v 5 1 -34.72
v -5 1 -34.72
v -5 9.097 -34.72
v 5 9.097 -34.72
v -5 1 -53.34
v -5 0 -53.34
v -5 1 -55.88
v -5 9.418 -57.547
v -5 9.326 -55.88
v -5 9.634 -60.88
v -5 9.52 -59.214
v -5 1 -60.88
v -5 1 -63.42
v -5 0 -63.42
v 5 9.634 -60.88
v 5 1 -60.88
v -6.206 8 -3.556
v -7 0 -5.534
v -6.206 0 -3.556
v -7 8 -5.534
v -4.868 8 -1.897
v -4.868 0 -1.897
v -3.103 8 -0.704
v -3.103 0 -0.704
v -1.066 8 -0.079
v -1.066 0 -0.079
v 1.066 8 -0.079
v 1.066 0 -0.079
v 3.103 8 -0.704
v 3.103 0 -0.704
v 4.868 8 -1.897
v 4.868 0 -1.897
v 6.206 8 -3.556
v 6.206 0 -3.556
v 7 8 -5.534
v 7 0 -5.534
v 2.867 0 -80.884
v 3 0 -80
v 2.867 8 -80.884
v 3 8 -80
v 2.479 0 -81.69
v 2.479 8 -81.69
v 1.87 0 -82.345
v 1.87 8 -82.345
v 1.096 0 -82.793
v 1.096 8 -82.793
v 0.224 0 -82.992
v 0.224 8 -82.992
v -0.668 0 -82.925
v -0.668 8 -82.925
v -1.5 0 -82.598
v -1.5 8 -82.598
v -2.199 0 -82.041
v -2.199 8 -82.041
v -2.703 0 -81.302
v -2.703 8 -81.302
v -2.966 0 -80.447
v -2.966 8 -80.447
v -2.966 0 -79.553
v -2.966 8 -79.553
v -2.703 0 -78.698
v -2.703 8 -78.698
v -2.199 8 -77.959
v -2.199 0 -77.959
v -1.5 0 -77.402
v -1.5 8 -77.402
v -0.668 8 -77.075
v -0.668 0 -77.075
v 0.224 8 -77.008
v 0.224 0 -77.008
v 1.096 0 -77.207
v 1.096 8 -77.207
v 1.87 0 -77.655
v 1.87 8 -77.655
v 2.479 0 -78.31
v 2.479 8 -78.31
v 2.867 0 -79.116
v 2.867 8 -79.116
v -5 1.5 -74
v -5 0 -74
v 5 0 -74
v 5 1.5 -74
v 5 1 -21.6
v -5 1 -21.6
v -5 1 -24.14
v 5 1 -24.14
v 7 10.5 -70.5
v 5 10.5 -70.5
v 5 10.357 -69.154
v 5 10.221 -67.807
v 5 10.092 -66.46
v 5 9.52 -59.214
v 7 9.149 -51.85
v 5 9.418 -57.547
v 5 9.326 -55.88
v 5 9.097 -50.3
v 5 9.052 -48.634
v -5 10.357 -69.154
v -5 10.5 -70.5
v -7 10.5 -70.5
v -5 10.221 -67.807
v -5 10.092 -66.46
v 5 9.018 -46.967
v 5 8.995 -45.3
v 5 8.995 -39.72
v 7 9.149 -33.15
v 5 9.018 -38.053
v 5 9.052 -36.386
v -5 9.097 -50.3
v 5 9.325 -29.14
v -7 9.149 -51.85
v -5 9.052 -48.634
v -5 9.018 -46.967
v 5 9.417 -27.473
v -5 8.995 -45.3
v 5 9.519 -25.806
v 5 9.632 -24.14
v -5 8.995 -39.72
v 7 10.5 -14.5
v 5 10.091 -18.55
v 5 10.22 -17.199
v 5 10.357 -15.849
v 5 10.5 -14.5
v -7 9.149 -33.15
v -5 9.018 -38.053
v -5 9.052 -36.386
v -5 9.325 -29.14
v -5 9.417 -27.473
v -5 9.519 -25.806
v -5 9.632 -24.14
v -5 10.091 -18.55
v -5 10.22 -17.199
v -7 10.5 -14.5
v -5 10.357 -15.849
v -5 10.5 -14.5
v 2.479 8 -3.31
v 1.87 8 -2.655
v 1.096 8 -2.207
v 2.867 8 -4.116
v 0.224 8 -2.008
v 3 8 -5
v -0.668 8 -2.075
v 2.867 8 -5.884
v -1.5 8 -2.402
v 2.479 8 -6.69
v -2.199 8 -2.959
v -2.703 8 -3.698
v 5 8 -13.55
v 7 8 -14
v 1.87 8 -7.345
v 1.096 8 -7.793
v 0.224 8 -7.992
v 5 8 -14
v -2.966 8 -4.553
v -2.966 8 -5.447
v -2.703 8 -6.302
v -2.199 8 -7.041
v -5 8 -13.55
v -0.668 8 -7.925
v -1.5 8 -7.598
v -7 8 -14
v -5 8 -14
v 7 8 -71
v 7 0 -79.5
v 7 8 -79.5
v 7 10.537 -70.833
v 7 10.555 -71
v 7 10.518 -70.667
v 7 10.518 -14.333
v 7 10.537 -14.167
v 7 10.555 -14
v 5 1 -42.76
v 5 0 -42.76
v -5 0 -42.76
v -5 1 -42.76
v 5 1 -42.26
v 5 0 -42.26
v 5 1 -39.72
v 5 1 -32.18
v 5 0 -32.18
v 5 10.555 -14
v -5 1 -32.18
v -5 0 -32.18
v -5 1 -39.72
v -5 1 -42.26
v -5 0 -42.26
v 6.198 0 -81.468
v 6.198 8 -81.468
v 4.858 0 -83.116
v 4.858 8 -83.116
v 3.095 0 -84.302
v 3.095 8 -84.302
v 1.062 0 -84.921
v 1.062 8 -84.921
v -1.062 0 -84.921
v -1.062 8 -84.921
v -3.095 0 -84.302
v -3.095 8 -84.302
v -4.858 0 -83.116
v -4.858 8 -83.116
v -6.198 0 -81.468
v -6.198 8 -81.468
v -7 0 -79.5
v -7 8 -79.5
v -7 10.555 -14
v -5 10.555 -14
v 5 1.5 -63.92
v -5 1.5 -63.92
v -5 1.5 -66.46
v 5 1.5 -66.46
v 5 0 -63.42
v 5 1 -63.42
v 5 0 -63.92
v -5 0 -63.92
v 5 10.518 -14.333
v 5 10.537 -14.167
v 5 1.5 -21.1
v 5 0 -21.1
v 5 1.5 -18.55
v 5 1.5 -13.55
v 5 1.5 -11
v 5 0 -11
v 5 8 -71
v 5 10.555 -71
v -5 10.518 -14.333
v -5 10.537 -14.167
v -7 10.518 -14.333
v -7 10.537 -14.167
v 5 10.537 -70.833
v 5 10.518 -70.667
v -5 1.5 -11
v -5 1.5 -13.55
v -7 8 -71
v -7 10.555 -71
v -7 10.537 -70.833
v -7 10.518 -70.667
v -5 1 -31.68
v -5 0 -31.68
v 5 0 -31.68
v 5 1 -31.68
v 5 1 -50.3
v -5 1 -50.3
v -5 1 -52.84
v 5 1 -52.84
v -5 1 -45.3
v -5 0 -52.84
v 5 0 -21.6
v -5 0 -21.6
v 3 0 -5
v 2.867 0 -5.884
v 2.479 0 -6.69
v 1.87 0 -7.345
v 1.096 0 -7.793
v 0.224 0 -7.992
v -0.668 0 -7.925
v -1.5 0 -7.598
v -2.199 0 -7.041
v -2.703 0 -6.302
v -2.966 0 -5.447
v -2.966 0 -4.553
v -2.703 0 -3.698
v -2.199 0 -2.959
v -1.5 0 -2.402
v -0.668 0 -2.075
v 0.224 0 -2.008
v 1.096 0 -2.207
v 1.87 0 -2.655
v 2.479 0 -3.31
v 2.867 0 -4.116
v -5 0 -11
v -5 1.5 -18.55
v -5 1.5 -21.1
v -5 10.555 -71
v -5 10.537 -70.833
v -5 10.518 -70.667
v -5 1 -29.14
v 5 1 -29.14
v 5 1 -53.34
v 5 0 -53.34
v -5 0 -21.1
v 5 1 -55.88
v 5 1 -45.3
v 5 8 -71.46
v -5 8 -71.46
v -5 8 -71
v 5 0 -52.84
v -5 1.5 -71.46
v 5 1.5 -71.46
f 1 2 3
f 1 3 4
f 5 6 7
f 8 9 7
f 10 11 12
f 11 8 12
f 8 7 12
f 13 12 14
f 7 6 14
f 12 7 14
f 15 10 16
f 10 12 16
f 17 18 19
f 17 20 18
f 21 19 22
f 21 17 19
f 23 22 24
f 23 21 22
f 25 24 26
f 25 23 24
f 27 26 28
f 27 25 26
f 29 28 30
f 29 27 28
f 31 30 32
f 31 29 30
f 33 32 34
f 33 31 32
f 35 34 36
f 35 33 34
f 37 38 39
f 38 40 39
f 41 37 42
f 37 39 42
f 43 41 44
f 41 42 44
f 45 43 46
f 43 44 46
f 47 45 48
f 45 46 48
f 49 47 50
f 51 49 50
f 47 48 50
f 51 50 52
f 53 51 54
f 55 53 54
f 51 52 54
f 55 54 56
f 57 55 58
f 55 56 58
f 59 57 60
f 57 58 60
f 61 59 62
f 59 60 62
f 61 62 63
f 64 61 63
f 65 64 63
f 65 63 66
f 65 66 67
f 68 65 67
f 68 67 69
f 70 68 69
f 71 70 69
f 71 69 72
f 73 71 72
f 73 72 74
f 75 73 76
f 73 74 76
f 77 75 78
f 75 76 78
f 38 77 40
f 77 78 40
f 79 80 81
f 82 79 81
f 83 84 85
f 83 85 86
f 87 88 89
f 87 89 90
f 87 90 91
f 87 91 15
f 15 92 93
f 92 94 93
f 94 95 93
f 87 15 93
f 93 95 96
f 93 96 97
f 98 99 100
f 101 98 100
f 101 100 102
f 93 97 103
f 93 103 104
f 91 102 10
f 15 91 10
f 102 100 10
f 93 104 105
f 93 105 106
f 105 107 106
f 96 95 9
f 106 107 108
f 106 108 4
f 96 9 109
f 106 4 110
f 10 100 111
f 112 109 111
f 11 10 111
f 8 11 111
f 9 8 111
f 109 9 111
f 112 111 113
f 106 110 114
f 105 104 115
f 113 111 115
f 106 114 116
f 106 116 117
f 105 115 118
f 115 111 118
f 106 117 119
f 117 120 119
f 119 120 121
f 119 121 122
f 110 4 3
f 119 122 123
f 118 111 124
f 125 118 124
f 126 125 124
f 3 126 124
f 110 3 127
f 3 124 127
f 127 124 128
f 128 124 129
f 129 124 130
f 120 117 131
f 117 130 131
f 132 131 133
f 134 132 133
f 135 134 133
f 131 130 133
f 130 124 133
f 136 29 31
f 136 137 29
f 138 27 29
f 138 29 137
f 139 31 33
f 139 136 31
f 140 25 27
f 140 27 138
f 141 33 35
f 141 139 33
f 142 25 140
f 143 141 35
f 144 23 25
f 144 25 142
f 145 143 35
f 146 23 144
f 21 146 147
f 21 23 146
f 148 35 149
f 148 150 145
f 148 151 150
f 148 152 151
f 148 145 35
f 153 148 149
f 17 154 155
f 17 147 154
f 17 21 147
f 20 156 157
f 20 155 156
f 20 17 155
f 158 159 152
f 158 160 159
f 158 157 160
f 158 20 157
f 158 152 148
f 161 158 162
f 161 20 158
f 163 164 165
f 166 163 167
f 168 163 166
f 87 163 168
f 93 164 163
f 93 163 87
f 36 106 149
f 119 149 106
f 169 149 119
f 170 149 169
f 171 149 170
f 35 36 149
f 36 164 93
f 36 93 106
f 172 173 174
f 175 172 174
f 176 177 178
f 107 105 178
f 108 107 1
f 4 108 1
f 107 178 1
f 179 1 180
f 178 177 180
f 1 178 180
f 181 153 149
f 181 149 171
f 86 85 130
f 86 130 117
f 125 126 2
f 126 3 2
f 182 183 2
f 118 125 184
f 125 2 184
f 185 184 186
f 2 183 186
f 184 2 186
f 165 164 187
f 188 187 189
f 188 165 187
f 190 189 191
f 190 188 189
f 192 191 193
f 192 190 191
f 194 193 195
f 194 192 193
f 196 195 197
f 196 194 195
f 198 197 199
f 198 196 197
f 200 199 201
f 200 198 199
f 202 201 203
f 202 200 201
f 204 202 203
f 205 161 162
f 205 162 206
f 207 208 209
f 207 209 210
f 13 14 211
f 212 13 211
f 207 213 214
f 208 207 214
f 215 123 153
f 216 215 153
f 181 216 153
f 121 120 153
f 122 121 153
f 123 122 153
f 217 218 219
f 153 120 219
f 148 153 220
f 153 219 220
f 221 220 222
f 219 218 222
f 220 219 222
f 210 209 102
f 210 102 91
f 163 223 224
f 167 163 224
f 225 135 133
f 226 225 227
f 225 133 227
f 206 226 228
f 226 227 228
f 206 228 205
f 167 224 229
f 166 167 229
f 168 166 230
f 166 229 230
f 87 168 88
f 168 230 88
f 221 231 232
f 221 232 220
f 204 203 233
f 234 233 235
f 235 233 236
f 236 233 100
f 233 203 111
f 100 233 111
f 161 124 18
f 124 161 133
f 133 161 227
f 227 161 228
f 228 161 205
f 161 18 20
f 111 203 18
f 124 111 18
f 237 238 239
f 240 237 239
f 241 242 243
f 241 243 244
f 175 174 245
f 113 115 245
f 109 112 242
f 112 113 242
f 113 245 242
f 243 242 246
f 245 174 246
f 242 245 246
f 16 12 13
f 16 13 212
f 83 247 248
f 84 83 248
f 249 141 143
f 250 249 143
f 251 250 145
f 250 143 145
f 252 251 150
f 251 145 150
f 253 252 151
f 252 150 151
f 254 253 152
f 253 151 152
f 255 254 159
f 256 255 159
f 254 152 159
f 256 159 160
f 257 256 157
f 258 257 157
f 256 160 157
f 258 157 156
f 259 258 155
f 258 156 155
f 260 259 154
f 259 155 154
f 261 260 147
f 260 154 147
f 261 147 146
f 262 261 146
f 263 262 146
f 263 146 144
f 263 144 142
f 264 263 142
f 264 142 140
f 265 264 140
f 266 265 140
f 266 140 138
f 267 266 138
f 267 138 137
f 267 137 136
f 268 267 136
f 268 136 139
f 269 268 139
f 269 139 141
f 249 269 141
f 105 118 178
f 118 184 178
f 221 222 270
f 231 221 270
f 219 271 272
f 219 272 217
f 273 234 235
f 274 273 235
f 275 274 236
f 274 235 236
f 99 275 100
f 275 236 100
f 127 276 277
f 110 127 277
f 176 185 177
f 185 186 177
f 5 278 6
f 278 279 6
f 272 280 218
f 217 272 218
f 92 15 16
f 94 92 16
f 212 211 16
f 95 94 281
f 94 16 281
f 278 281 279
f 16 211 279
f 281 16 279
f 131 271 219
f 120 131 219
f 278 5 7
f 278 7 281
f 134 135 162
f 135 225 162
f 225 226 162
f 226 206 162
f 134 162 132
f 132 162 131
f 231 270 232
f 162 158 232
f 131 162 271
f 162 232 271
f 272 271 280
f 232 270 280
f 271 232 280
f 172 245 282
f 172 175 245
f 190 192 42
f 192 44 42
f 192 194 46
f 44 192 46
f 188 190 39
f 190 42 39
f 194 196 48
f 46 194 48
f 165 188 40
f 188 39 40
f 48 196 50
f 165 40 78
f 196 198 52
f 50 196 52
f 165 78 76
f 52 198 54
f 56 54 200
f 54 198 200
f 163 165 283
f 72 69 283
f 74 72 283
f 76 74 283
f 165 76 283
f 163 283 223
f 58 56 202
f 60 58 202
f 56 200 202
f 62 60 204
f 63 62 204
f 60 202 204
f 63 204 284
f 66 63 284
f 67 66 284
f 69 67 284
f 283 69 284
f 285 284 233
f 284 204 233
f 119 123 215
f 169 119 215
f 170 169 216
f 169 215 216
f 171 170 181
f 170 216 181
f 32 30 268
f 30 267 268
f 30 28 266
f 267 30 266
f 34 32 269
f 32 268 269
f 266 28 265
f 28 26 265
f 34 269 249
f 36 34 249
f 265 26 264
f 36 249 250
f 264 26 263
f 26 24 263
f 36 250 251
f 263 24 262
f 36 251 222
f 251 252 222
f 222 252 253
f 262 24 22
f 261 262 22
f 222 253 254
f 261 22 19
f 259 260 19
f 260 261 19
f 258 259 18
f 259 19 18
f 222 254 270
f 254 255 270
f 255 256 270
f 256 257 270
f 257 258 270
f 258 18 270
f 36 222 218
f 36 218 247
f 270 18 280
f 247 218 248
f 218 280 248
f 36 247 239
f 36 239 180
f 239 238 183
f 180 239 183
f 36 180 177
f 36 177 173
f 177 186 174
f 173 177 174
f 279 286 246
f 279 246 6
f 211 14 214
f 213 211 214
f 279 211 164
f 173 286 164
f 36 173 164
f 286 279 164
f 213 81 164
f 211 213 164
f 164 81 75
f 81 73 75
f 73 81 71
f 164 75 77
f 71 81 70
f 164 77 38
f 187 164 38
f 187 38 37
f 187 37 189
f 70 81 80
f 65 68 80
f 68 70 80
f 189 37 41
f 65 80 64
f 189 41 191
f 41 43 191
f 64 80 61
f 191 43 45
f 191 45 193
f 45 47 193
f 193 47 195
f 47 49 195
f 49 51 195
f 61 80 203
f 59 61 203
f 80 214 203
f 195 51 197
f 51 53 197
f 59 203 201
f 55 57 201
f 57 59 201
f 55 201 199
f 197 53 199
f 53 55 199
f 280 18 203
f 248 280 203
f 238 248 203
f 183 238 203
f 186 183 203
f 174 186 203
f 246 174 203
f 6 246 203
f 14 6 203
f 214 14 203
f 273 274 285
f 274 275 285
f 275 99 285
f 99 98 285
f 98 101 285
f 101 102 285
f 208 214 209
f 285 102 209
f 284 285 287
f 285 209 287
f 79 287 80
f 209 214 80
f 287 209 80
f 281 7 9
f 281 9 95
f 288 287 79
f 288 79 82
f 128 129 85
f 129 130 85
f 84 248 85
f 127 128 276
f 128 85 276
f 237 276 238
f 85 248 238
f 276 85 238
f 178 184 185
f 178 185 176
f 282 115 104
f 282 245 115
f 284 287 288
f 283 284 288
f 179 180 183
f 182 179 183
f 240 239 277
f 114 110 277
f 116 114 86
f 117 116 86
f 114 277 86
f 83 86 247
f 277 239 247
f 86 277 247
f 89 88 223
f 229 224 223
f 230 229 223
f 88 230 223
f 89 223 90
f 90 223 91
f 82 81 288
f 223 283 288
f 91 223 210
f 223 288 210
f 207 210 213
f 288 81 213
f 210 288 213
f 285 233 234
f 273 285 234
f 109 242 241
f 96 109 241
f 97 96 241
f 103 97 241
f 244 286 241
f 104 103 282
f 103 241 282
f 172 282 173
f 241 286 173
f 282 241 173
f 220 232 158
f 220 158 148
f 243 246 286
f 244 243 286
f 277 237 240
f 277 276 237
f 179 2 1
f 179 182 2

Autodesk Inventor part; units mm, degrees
ref_plane "YZ Plane" through (0, 0, 0) normal (1, 0, 0) x (0, 1, 0)
ref_plane "XY Plane" through (0, 0, 0) normal (0, 0, 1) x (1, 0, 0)
sketch "Sketch1" plane through (0, 0, 0) normal (1, 0, 0) x (0, 1, 0)
  line L0 (0, 0) -> (0, -85)
  line L1 (0, -85) -> (8, -85)
  line L2 (0, 0) -> (8, 0)
  line L3 (8, 0) -> (8, -14)
  line L4 (8, -85) -> (8, -71)
  line L5 (8, -14) -> (9, -14)
  line L6 (8, -71) -> (9, -71)
  arc A0 (10.5, -14.5) -> (10.5, -70.5) centre (267.5593, -42.5) ccw
  line L7 (8, -71) -> (10.555, -71)
  line L8 (8, -14) -> (10.555, -14)
  arc A1 (10.555, -14) -> (10.555, -71) centre (267.5473, -42.5) ccw
extrude "Extrusion1" add sketch "Sketch1" along normal mid plane 14
sketch "Sketch2" plane through (-7, 8, 0) normal (0, 1, 0) x (1, 0, 0)
  line L0 (0, 85) -> (0, 0) projected
  line L1 (0, 14.0338) -> (0, 5.5338)
  line L2 (14, 0) -> (14, 85) projected
  line L3 (14, 14.0338) -> (14, 5.5338)
  arc A0 (0, 5.5338) -> (14, 5.5338) centre (7, 7.1942) ccw
  line L4 (0, 5.5338) -> (0, 0)
  line L5 (0, 0) -> (14, 0) projected
  line L6 (14, 0) -> (14, 5.5338)
  point P0 (7, 0)
  dimension "d13" = 8.5
extrude "Extrusion2" cut sketch "Sketch2" against normal blind 14
sketch "Sketch3" plane through (-7, 8, -71) normal (0, 1, 0) x (1, 0, 0)
  line L0 (0, 0) -> (14, 0) projected
  line L1 (0, 0) -> (0, 14) projected
  arc A0 (14, 8.5) -> (0, 8.5) centre (7, 6.7955) ccw
  line L2 (0, 8.5) -> (0, 14)
  line L3 (0, 14) -> (14, 14) projected
  line L4 (14, 14) -> (14, 8.5)
  line L5 (14, -65.4662) -> (14, 14) projected
  line L6 (0, 14) -> (0, 8.5)
  line L7 (14, 8.5) -> (14, 14)
  line L8 (14, 14) -> (0, 14)
  line L9 (0, 8.5) -> (0, 14)
  line L10 (0, 14) -> (14, 14) projected
  line L11 (14, 14) -> (14, 8.5)
  line L12 (14, 14) -> (14, 0) projected
  arc A1 (14, 8.5) -> (0, 8.5) centre (7, 6.7955) ccw
  point P0 (7, -71)
extrude "Extrusion3" cut sketch "Sketch3" against normal blind 14 contours L1 L3 A0 | A0 L3 L4
sketch "Sketch4" plane through (-7, 8, -71) normal (0, 1, 0) x (1, 0, 0)
  arc A0 (14, 8.5) -> (0, 8.5) centre (7, 6.7955) ccw projected
  line L0 (7, 0.0396) -> (7, 3.0396)
  circle A1 centre (7, 9) radius 3
  point P0 (7, -71)
extrude "Extrusion4" cut sketch "Sketch4" against normal blind 14
sketch "Sketch5" plane through (-7, 8, -14) normal (0, 1, 0) x (1, 0, 0)
  circle A0 centre (7, -9) radius 3
  point P0 (7, -14)
extrude "Extrusion5" cut sketch "Sketch5" against normal blind 14
sketch "Sketch6" plane through (0, 0, -7.1942) normal (0, -1, 0) x (1, 0, 0)
  point P0 (0, 7.1942)
sketch "Sketch7" plane through (0, 0, -7.1942) normal (0, -1, 0) x (1, 0, 0)
  circle A0 centre (0, 2.1942) radius 3 projected
  line L0 (0, -0.8058) -> (0, -3.8058)
  circle A1 centre (0, -72.8058) radius 3 projected
  line L1 (0, -69.8058) -> (0, -66.8058)
  line L2 (0, -66.8058) -> (-5, -66.8058)
  line L3 (-5, -66.8058) -> (5, -66.8058)
  line L4 (-5, -66.8058) -> (5, -66.8058)
  line L5 (5, -66.8058) -> (5, -56.7258)
  line L6 (5, -56.7258) -> (-5, -56.7258)
  line L7 (-5, -56.7258) -> (-5, -66.8058)
  line L8 (0, -56.7258) -> (0, -56.2258)
  line L9 (-5, -56.2258) -> (5, -56.2258)
  line L10 (5, -56.2258) -> (5, -46.1458)
  line L11 (5, -46.1458) -> (-5, -46.1458)
  line L12 (-5, -46.1458) -> (-5, -56.2258)
  line L13 (0, -46.1458) -> (0, -45.6458)
  line L14 (-5, -45.6458) -> (5, -45.6458)
  line L15 (5, -45.6458) -> (5, -35.5658)
  line L16 (5, -35.5658) -> (-5, -35.5658)
  line L17 (-5, -35.5658) -> (-5, -45.6458)
  line L18 (0, -35.5658) -> (0, -35.0658)
  line L19 (-5, -35.0658) -> (5, -35.0658)
  line L20 (5, -35.0658) -> (5, -24.9858)
  line L21 (5, -24.9858) -> (-5, -24.9858)
  line L22 (-5, -24.9858) -> (-5, -35.0658)
  line L23 (0, -24.9858) -> (0, -24.4858)
  line L24 (-5, -24.4858) -> (5, -24.4858)
  line L25 (5, -24.4858) -> (5, -14.4058)
  line L26 (5, -14.4058) -> (-5, -14.4058)
  line L27 (-5, -14.4058) -> (-5, -24.4858)
  line L28 (0, -14.4058) -> (0, -13.9058)
  line L29 (-5, -13.9058) -> (5, -13.9058)
  line L30 (5, -13.9058) -> (5, -3.8058)
  line L31 (5, -3.8058) -> (-5, -3.8058)
  line L32 (-5, -3.8058) -> (-5, -13.9058)
  point P0 (0, 7.1942)
extrude "Extrusion6" cut sketch "Sketch7" against normal blind 1.5 contours L6 L5 L3 L2 L7 | L31 L30 L29 L32
sketch "Sketch8" plane through (0, 0, -7.1942) normal (0, -1, 0) x (1, 0, 0)
  line L0 (-5, -56.7258) -> (5, -56.7258) projected
  line L1 (0, -56.7258) -> (0, -56.2258)
  line L2 (-5, -56.2258) -> (5, -56.2258)
  line L3 (5, -56.2258) -> (5, -46.1458)
  line L4 (5, -46.1458) -> (-5, -46.1458)
  line L5 (-5, -46.1458) -> (-5, -56.2258)
  line L6 (0, -46.1458) -> (0, -45.6458)
  line L7 (-5, -45.6458) -> (5, -45.6458)
  line L8 (5, -45.6458) -> (5, -35.5658)
  line L9 (5, -35.5658) -> (-5, -35.5658)
  line L10 (-5, -35.5658) -> (-5, -45.6458)
  line L11 (0, -35.5658) -> (0, -35.0658)
  line L12 (-5, -35.0658) -> (5, -35.0658)
  line L13 (5, -35.0658) -> (5, -24.9858)
  line L14 (5, -24.9858) -> (-5, -24.9858)
  line L15 (-5, -24.9858) -> (-5, -35.0658)
  line L16 (0, -24.9858) -> (0, -24.4858)
  line L17 (-5, -24.4858) -> (5, -24.4858)
  line L18 (5, -24.4858) -> (5, -14.4058)
  line L19 (5, -14.4058) -> (-5, -14.4058)
  line L20 (-5, -14.4058) -> (-5, -24.4858)
  point P0 (0, 7.1942)
  dimension "d75" = 0.5
  dimension "d76" = 10.08
  dimension "d77" = 0.5
  dimension "d78" = 10.08
  dimension "d79" = 0.5
  dimension "d80" = 10.08
  dimension "d81" = 0.5
  dimension "d82" = 10.08
extrude "Extrusion7" cut sketch "Sketch8" against normal blind 1
sketch "Sketch9" plane through (0, 1.5, -7.1942) normal (0, -1, 0) x (1, 0, 0)
  line L0 (-5, -66.8058) -> (-5, -56.7258) projected
  line L1 (5, -56.7258) -> (5, -66.8058) projected
  line L2 (-5, -59.2658) -> (5, -59.2658)
  line L3 (-5, -64.2658) -> (5, -64.2658)
  line L4 (-5, -64.2658) -> (-5, -59.2658)
  line L5 (5, -64.2658) -> (5, -59.2658)
  line L6 (5, -64.2658) -> (5, -59.2658)
  point P0 (0, 7.1942)
extrude "Extrusion8" cut sketch "Sketch9" against normal blind 20
sketch "Sketch10" plane through (0, 1, -7.1942) normal (0, -1, 0) x (1, 0, 0)
  line L0 (-5, -56.2258) -> (-5, -46.1458) projected
  line L1 (5, -46.1458) -> (5, -56.2258) projected
  line L2 (-5, -53.6858) -> (5, -53.6858)
  line L3 (-5, -48.6858) -> (5, -48.6858)
  line L4 (5, -48.6858) -> (5, -53.6858)
  line L5 (-5, -48.6858) -> (-5, -53.6858)
  point P0 (0, 7.1942)
  dimension "d95" = 20
  dimension "d96" = 0
extrude "Extrusion9" cut sketch "Sketch10" against normal blind 20
sketch "Sketch11" plane through (0, 1, -7.1942) normal (0, -1, 0) x (1, 0, 0)
  line L0 (-5, -45.6458) -> (-5, -35.5658) projected
  line L1 (5, -35.5658) -> (5, -45.6458) projected
  line L2 (-5, -43.1058) -> (5, -43.1058)
  line L3 (-5, -38.1058) -> (5, -38.1058)
  line L4 (5, -38.1058) -> (5, -43.1058)
  line L5 (-5, -38.1058) -> (-5, -43.1058)
  point P0 (0, 7.1942)
extrude "Extrusion10" cut sketch "Sketch11" against normal blind 20
sketch "Sketch12" plane through (0, 1, -7.1942) normal (0, -1, 0) x (1, 0, 0)
  line L0 (-5, -35.0658) -> (-5, -24.9858) projected
  line L1 (5, -24.9858) -> (5, -35.0658) projected
  line L2 (-5, -32.5258) -> (5, -32.5258)
  line L3 (-5, -27.5258) -> (5, -27.5258)
  line L4 (5, -27.5258) -> (5, -32.5258)
  line L5 (-5, -27.5258) -> (-5, -32.5258)
  point P0 (0, 7.1942)
extrude "Extrusion11" cut sketch "Sketch12" against normal blind 20
sketch "Sketch13" plane through (0, 1, -7.1942) normal (0, -1, 0) x (1, 0, 0)
  line L0 (-5, -24.4858) -> (-5, -14.4058) projected
  line L1 (-5, -21.9458) -> (5, -21.9458)
  line L2 (-5, -16.9458) -> (5, -16.9458)
  line L3 (5, -16.9458) -> (5, -21.9458)
  line L4 (5, -14.4058) -> (5, -24.4858) projected
  line L5 (-5, -16.9458) -> (-5, -21.9458)
  point P0 (0, 7.1942)
extrude "Extrusion12" cut sketch "Sketch13" against normal blind 20
sketch "Sketch14" plane through (0, 1.5, -7.1942) normal (0, -1, 0) x (1, 0, 0)
  line L0 (-5, -13.9058) -> (-5, -3.8058) projected
  line L1 (5, -3.8058) -> (5, -13.9058) projected
  line L2 (-5, -11.3558) -> (5, -11.3558)
  line L3 (-5, -6.3558) -> (5, -6.3558)
  line L4 (5, -6.3558) -> (5, -11.3558)
  line L5 (-5, -6.772) -> (-5, -11.3558)
  line L6 (-5, -6.3558) -> (-5, -11.3558)
  point P0 (0, 7.1942)
extrude "Extrusion13" cut sketch "Sketch14" against normal blind 20
sketch "Sketch15" plane through (0, 1.5, -7.1942) normal (0, -1, 0) x (1, 0, 0)
  point P0 (0, 7.1942)
sketch "Sketch16" plane through (0, 1.5, -7.1942) normal (0, -1, 0) x (1, 0, 0)
  point P0 (0, 7.1942)
sketch "Sketch17" plane through (0, 0, -7.1942) normal (0, -1, 0) x (1, 0, 0)
  point P0 (0, 7.1942)
sketch "Sketch18" plane through (7, 0, 0) normal (1, 0, 0) x (0, 0, -1)
  point P0 (0, 0)
sketch "Sketch19" plane through (0, 1, -7.1942) normal (0, -1, 0) x (1, 0, 0)
  line L0 (-5, -13.9058) -> (-5, -11.3558) projected
  line L1 (-5, -11.3558) -> (-5, -59.3271)
  line L2 (-5, -66.8058) -> (-5, -56.7258) projected
  point P0 (0, 7.1942)
ref_plane "Work Plane1" through (0, 8.9795, -42.5) normal (0, 1, 0) x (-1, 0, 0)
sketch "Sketch20" plane through (0, 8.9795, -42.5) normal (0, 1, 0) x (-1, 0, 0)
  point P0 (0, 42.5)
sketch "Sketch21" plane through (-5, 0, -21.6) normal (1, 0, 0) x (0, 0, -1)
  point P0 (-21.6, 0)
properties part number "segurador das cordas" material "Steel"
